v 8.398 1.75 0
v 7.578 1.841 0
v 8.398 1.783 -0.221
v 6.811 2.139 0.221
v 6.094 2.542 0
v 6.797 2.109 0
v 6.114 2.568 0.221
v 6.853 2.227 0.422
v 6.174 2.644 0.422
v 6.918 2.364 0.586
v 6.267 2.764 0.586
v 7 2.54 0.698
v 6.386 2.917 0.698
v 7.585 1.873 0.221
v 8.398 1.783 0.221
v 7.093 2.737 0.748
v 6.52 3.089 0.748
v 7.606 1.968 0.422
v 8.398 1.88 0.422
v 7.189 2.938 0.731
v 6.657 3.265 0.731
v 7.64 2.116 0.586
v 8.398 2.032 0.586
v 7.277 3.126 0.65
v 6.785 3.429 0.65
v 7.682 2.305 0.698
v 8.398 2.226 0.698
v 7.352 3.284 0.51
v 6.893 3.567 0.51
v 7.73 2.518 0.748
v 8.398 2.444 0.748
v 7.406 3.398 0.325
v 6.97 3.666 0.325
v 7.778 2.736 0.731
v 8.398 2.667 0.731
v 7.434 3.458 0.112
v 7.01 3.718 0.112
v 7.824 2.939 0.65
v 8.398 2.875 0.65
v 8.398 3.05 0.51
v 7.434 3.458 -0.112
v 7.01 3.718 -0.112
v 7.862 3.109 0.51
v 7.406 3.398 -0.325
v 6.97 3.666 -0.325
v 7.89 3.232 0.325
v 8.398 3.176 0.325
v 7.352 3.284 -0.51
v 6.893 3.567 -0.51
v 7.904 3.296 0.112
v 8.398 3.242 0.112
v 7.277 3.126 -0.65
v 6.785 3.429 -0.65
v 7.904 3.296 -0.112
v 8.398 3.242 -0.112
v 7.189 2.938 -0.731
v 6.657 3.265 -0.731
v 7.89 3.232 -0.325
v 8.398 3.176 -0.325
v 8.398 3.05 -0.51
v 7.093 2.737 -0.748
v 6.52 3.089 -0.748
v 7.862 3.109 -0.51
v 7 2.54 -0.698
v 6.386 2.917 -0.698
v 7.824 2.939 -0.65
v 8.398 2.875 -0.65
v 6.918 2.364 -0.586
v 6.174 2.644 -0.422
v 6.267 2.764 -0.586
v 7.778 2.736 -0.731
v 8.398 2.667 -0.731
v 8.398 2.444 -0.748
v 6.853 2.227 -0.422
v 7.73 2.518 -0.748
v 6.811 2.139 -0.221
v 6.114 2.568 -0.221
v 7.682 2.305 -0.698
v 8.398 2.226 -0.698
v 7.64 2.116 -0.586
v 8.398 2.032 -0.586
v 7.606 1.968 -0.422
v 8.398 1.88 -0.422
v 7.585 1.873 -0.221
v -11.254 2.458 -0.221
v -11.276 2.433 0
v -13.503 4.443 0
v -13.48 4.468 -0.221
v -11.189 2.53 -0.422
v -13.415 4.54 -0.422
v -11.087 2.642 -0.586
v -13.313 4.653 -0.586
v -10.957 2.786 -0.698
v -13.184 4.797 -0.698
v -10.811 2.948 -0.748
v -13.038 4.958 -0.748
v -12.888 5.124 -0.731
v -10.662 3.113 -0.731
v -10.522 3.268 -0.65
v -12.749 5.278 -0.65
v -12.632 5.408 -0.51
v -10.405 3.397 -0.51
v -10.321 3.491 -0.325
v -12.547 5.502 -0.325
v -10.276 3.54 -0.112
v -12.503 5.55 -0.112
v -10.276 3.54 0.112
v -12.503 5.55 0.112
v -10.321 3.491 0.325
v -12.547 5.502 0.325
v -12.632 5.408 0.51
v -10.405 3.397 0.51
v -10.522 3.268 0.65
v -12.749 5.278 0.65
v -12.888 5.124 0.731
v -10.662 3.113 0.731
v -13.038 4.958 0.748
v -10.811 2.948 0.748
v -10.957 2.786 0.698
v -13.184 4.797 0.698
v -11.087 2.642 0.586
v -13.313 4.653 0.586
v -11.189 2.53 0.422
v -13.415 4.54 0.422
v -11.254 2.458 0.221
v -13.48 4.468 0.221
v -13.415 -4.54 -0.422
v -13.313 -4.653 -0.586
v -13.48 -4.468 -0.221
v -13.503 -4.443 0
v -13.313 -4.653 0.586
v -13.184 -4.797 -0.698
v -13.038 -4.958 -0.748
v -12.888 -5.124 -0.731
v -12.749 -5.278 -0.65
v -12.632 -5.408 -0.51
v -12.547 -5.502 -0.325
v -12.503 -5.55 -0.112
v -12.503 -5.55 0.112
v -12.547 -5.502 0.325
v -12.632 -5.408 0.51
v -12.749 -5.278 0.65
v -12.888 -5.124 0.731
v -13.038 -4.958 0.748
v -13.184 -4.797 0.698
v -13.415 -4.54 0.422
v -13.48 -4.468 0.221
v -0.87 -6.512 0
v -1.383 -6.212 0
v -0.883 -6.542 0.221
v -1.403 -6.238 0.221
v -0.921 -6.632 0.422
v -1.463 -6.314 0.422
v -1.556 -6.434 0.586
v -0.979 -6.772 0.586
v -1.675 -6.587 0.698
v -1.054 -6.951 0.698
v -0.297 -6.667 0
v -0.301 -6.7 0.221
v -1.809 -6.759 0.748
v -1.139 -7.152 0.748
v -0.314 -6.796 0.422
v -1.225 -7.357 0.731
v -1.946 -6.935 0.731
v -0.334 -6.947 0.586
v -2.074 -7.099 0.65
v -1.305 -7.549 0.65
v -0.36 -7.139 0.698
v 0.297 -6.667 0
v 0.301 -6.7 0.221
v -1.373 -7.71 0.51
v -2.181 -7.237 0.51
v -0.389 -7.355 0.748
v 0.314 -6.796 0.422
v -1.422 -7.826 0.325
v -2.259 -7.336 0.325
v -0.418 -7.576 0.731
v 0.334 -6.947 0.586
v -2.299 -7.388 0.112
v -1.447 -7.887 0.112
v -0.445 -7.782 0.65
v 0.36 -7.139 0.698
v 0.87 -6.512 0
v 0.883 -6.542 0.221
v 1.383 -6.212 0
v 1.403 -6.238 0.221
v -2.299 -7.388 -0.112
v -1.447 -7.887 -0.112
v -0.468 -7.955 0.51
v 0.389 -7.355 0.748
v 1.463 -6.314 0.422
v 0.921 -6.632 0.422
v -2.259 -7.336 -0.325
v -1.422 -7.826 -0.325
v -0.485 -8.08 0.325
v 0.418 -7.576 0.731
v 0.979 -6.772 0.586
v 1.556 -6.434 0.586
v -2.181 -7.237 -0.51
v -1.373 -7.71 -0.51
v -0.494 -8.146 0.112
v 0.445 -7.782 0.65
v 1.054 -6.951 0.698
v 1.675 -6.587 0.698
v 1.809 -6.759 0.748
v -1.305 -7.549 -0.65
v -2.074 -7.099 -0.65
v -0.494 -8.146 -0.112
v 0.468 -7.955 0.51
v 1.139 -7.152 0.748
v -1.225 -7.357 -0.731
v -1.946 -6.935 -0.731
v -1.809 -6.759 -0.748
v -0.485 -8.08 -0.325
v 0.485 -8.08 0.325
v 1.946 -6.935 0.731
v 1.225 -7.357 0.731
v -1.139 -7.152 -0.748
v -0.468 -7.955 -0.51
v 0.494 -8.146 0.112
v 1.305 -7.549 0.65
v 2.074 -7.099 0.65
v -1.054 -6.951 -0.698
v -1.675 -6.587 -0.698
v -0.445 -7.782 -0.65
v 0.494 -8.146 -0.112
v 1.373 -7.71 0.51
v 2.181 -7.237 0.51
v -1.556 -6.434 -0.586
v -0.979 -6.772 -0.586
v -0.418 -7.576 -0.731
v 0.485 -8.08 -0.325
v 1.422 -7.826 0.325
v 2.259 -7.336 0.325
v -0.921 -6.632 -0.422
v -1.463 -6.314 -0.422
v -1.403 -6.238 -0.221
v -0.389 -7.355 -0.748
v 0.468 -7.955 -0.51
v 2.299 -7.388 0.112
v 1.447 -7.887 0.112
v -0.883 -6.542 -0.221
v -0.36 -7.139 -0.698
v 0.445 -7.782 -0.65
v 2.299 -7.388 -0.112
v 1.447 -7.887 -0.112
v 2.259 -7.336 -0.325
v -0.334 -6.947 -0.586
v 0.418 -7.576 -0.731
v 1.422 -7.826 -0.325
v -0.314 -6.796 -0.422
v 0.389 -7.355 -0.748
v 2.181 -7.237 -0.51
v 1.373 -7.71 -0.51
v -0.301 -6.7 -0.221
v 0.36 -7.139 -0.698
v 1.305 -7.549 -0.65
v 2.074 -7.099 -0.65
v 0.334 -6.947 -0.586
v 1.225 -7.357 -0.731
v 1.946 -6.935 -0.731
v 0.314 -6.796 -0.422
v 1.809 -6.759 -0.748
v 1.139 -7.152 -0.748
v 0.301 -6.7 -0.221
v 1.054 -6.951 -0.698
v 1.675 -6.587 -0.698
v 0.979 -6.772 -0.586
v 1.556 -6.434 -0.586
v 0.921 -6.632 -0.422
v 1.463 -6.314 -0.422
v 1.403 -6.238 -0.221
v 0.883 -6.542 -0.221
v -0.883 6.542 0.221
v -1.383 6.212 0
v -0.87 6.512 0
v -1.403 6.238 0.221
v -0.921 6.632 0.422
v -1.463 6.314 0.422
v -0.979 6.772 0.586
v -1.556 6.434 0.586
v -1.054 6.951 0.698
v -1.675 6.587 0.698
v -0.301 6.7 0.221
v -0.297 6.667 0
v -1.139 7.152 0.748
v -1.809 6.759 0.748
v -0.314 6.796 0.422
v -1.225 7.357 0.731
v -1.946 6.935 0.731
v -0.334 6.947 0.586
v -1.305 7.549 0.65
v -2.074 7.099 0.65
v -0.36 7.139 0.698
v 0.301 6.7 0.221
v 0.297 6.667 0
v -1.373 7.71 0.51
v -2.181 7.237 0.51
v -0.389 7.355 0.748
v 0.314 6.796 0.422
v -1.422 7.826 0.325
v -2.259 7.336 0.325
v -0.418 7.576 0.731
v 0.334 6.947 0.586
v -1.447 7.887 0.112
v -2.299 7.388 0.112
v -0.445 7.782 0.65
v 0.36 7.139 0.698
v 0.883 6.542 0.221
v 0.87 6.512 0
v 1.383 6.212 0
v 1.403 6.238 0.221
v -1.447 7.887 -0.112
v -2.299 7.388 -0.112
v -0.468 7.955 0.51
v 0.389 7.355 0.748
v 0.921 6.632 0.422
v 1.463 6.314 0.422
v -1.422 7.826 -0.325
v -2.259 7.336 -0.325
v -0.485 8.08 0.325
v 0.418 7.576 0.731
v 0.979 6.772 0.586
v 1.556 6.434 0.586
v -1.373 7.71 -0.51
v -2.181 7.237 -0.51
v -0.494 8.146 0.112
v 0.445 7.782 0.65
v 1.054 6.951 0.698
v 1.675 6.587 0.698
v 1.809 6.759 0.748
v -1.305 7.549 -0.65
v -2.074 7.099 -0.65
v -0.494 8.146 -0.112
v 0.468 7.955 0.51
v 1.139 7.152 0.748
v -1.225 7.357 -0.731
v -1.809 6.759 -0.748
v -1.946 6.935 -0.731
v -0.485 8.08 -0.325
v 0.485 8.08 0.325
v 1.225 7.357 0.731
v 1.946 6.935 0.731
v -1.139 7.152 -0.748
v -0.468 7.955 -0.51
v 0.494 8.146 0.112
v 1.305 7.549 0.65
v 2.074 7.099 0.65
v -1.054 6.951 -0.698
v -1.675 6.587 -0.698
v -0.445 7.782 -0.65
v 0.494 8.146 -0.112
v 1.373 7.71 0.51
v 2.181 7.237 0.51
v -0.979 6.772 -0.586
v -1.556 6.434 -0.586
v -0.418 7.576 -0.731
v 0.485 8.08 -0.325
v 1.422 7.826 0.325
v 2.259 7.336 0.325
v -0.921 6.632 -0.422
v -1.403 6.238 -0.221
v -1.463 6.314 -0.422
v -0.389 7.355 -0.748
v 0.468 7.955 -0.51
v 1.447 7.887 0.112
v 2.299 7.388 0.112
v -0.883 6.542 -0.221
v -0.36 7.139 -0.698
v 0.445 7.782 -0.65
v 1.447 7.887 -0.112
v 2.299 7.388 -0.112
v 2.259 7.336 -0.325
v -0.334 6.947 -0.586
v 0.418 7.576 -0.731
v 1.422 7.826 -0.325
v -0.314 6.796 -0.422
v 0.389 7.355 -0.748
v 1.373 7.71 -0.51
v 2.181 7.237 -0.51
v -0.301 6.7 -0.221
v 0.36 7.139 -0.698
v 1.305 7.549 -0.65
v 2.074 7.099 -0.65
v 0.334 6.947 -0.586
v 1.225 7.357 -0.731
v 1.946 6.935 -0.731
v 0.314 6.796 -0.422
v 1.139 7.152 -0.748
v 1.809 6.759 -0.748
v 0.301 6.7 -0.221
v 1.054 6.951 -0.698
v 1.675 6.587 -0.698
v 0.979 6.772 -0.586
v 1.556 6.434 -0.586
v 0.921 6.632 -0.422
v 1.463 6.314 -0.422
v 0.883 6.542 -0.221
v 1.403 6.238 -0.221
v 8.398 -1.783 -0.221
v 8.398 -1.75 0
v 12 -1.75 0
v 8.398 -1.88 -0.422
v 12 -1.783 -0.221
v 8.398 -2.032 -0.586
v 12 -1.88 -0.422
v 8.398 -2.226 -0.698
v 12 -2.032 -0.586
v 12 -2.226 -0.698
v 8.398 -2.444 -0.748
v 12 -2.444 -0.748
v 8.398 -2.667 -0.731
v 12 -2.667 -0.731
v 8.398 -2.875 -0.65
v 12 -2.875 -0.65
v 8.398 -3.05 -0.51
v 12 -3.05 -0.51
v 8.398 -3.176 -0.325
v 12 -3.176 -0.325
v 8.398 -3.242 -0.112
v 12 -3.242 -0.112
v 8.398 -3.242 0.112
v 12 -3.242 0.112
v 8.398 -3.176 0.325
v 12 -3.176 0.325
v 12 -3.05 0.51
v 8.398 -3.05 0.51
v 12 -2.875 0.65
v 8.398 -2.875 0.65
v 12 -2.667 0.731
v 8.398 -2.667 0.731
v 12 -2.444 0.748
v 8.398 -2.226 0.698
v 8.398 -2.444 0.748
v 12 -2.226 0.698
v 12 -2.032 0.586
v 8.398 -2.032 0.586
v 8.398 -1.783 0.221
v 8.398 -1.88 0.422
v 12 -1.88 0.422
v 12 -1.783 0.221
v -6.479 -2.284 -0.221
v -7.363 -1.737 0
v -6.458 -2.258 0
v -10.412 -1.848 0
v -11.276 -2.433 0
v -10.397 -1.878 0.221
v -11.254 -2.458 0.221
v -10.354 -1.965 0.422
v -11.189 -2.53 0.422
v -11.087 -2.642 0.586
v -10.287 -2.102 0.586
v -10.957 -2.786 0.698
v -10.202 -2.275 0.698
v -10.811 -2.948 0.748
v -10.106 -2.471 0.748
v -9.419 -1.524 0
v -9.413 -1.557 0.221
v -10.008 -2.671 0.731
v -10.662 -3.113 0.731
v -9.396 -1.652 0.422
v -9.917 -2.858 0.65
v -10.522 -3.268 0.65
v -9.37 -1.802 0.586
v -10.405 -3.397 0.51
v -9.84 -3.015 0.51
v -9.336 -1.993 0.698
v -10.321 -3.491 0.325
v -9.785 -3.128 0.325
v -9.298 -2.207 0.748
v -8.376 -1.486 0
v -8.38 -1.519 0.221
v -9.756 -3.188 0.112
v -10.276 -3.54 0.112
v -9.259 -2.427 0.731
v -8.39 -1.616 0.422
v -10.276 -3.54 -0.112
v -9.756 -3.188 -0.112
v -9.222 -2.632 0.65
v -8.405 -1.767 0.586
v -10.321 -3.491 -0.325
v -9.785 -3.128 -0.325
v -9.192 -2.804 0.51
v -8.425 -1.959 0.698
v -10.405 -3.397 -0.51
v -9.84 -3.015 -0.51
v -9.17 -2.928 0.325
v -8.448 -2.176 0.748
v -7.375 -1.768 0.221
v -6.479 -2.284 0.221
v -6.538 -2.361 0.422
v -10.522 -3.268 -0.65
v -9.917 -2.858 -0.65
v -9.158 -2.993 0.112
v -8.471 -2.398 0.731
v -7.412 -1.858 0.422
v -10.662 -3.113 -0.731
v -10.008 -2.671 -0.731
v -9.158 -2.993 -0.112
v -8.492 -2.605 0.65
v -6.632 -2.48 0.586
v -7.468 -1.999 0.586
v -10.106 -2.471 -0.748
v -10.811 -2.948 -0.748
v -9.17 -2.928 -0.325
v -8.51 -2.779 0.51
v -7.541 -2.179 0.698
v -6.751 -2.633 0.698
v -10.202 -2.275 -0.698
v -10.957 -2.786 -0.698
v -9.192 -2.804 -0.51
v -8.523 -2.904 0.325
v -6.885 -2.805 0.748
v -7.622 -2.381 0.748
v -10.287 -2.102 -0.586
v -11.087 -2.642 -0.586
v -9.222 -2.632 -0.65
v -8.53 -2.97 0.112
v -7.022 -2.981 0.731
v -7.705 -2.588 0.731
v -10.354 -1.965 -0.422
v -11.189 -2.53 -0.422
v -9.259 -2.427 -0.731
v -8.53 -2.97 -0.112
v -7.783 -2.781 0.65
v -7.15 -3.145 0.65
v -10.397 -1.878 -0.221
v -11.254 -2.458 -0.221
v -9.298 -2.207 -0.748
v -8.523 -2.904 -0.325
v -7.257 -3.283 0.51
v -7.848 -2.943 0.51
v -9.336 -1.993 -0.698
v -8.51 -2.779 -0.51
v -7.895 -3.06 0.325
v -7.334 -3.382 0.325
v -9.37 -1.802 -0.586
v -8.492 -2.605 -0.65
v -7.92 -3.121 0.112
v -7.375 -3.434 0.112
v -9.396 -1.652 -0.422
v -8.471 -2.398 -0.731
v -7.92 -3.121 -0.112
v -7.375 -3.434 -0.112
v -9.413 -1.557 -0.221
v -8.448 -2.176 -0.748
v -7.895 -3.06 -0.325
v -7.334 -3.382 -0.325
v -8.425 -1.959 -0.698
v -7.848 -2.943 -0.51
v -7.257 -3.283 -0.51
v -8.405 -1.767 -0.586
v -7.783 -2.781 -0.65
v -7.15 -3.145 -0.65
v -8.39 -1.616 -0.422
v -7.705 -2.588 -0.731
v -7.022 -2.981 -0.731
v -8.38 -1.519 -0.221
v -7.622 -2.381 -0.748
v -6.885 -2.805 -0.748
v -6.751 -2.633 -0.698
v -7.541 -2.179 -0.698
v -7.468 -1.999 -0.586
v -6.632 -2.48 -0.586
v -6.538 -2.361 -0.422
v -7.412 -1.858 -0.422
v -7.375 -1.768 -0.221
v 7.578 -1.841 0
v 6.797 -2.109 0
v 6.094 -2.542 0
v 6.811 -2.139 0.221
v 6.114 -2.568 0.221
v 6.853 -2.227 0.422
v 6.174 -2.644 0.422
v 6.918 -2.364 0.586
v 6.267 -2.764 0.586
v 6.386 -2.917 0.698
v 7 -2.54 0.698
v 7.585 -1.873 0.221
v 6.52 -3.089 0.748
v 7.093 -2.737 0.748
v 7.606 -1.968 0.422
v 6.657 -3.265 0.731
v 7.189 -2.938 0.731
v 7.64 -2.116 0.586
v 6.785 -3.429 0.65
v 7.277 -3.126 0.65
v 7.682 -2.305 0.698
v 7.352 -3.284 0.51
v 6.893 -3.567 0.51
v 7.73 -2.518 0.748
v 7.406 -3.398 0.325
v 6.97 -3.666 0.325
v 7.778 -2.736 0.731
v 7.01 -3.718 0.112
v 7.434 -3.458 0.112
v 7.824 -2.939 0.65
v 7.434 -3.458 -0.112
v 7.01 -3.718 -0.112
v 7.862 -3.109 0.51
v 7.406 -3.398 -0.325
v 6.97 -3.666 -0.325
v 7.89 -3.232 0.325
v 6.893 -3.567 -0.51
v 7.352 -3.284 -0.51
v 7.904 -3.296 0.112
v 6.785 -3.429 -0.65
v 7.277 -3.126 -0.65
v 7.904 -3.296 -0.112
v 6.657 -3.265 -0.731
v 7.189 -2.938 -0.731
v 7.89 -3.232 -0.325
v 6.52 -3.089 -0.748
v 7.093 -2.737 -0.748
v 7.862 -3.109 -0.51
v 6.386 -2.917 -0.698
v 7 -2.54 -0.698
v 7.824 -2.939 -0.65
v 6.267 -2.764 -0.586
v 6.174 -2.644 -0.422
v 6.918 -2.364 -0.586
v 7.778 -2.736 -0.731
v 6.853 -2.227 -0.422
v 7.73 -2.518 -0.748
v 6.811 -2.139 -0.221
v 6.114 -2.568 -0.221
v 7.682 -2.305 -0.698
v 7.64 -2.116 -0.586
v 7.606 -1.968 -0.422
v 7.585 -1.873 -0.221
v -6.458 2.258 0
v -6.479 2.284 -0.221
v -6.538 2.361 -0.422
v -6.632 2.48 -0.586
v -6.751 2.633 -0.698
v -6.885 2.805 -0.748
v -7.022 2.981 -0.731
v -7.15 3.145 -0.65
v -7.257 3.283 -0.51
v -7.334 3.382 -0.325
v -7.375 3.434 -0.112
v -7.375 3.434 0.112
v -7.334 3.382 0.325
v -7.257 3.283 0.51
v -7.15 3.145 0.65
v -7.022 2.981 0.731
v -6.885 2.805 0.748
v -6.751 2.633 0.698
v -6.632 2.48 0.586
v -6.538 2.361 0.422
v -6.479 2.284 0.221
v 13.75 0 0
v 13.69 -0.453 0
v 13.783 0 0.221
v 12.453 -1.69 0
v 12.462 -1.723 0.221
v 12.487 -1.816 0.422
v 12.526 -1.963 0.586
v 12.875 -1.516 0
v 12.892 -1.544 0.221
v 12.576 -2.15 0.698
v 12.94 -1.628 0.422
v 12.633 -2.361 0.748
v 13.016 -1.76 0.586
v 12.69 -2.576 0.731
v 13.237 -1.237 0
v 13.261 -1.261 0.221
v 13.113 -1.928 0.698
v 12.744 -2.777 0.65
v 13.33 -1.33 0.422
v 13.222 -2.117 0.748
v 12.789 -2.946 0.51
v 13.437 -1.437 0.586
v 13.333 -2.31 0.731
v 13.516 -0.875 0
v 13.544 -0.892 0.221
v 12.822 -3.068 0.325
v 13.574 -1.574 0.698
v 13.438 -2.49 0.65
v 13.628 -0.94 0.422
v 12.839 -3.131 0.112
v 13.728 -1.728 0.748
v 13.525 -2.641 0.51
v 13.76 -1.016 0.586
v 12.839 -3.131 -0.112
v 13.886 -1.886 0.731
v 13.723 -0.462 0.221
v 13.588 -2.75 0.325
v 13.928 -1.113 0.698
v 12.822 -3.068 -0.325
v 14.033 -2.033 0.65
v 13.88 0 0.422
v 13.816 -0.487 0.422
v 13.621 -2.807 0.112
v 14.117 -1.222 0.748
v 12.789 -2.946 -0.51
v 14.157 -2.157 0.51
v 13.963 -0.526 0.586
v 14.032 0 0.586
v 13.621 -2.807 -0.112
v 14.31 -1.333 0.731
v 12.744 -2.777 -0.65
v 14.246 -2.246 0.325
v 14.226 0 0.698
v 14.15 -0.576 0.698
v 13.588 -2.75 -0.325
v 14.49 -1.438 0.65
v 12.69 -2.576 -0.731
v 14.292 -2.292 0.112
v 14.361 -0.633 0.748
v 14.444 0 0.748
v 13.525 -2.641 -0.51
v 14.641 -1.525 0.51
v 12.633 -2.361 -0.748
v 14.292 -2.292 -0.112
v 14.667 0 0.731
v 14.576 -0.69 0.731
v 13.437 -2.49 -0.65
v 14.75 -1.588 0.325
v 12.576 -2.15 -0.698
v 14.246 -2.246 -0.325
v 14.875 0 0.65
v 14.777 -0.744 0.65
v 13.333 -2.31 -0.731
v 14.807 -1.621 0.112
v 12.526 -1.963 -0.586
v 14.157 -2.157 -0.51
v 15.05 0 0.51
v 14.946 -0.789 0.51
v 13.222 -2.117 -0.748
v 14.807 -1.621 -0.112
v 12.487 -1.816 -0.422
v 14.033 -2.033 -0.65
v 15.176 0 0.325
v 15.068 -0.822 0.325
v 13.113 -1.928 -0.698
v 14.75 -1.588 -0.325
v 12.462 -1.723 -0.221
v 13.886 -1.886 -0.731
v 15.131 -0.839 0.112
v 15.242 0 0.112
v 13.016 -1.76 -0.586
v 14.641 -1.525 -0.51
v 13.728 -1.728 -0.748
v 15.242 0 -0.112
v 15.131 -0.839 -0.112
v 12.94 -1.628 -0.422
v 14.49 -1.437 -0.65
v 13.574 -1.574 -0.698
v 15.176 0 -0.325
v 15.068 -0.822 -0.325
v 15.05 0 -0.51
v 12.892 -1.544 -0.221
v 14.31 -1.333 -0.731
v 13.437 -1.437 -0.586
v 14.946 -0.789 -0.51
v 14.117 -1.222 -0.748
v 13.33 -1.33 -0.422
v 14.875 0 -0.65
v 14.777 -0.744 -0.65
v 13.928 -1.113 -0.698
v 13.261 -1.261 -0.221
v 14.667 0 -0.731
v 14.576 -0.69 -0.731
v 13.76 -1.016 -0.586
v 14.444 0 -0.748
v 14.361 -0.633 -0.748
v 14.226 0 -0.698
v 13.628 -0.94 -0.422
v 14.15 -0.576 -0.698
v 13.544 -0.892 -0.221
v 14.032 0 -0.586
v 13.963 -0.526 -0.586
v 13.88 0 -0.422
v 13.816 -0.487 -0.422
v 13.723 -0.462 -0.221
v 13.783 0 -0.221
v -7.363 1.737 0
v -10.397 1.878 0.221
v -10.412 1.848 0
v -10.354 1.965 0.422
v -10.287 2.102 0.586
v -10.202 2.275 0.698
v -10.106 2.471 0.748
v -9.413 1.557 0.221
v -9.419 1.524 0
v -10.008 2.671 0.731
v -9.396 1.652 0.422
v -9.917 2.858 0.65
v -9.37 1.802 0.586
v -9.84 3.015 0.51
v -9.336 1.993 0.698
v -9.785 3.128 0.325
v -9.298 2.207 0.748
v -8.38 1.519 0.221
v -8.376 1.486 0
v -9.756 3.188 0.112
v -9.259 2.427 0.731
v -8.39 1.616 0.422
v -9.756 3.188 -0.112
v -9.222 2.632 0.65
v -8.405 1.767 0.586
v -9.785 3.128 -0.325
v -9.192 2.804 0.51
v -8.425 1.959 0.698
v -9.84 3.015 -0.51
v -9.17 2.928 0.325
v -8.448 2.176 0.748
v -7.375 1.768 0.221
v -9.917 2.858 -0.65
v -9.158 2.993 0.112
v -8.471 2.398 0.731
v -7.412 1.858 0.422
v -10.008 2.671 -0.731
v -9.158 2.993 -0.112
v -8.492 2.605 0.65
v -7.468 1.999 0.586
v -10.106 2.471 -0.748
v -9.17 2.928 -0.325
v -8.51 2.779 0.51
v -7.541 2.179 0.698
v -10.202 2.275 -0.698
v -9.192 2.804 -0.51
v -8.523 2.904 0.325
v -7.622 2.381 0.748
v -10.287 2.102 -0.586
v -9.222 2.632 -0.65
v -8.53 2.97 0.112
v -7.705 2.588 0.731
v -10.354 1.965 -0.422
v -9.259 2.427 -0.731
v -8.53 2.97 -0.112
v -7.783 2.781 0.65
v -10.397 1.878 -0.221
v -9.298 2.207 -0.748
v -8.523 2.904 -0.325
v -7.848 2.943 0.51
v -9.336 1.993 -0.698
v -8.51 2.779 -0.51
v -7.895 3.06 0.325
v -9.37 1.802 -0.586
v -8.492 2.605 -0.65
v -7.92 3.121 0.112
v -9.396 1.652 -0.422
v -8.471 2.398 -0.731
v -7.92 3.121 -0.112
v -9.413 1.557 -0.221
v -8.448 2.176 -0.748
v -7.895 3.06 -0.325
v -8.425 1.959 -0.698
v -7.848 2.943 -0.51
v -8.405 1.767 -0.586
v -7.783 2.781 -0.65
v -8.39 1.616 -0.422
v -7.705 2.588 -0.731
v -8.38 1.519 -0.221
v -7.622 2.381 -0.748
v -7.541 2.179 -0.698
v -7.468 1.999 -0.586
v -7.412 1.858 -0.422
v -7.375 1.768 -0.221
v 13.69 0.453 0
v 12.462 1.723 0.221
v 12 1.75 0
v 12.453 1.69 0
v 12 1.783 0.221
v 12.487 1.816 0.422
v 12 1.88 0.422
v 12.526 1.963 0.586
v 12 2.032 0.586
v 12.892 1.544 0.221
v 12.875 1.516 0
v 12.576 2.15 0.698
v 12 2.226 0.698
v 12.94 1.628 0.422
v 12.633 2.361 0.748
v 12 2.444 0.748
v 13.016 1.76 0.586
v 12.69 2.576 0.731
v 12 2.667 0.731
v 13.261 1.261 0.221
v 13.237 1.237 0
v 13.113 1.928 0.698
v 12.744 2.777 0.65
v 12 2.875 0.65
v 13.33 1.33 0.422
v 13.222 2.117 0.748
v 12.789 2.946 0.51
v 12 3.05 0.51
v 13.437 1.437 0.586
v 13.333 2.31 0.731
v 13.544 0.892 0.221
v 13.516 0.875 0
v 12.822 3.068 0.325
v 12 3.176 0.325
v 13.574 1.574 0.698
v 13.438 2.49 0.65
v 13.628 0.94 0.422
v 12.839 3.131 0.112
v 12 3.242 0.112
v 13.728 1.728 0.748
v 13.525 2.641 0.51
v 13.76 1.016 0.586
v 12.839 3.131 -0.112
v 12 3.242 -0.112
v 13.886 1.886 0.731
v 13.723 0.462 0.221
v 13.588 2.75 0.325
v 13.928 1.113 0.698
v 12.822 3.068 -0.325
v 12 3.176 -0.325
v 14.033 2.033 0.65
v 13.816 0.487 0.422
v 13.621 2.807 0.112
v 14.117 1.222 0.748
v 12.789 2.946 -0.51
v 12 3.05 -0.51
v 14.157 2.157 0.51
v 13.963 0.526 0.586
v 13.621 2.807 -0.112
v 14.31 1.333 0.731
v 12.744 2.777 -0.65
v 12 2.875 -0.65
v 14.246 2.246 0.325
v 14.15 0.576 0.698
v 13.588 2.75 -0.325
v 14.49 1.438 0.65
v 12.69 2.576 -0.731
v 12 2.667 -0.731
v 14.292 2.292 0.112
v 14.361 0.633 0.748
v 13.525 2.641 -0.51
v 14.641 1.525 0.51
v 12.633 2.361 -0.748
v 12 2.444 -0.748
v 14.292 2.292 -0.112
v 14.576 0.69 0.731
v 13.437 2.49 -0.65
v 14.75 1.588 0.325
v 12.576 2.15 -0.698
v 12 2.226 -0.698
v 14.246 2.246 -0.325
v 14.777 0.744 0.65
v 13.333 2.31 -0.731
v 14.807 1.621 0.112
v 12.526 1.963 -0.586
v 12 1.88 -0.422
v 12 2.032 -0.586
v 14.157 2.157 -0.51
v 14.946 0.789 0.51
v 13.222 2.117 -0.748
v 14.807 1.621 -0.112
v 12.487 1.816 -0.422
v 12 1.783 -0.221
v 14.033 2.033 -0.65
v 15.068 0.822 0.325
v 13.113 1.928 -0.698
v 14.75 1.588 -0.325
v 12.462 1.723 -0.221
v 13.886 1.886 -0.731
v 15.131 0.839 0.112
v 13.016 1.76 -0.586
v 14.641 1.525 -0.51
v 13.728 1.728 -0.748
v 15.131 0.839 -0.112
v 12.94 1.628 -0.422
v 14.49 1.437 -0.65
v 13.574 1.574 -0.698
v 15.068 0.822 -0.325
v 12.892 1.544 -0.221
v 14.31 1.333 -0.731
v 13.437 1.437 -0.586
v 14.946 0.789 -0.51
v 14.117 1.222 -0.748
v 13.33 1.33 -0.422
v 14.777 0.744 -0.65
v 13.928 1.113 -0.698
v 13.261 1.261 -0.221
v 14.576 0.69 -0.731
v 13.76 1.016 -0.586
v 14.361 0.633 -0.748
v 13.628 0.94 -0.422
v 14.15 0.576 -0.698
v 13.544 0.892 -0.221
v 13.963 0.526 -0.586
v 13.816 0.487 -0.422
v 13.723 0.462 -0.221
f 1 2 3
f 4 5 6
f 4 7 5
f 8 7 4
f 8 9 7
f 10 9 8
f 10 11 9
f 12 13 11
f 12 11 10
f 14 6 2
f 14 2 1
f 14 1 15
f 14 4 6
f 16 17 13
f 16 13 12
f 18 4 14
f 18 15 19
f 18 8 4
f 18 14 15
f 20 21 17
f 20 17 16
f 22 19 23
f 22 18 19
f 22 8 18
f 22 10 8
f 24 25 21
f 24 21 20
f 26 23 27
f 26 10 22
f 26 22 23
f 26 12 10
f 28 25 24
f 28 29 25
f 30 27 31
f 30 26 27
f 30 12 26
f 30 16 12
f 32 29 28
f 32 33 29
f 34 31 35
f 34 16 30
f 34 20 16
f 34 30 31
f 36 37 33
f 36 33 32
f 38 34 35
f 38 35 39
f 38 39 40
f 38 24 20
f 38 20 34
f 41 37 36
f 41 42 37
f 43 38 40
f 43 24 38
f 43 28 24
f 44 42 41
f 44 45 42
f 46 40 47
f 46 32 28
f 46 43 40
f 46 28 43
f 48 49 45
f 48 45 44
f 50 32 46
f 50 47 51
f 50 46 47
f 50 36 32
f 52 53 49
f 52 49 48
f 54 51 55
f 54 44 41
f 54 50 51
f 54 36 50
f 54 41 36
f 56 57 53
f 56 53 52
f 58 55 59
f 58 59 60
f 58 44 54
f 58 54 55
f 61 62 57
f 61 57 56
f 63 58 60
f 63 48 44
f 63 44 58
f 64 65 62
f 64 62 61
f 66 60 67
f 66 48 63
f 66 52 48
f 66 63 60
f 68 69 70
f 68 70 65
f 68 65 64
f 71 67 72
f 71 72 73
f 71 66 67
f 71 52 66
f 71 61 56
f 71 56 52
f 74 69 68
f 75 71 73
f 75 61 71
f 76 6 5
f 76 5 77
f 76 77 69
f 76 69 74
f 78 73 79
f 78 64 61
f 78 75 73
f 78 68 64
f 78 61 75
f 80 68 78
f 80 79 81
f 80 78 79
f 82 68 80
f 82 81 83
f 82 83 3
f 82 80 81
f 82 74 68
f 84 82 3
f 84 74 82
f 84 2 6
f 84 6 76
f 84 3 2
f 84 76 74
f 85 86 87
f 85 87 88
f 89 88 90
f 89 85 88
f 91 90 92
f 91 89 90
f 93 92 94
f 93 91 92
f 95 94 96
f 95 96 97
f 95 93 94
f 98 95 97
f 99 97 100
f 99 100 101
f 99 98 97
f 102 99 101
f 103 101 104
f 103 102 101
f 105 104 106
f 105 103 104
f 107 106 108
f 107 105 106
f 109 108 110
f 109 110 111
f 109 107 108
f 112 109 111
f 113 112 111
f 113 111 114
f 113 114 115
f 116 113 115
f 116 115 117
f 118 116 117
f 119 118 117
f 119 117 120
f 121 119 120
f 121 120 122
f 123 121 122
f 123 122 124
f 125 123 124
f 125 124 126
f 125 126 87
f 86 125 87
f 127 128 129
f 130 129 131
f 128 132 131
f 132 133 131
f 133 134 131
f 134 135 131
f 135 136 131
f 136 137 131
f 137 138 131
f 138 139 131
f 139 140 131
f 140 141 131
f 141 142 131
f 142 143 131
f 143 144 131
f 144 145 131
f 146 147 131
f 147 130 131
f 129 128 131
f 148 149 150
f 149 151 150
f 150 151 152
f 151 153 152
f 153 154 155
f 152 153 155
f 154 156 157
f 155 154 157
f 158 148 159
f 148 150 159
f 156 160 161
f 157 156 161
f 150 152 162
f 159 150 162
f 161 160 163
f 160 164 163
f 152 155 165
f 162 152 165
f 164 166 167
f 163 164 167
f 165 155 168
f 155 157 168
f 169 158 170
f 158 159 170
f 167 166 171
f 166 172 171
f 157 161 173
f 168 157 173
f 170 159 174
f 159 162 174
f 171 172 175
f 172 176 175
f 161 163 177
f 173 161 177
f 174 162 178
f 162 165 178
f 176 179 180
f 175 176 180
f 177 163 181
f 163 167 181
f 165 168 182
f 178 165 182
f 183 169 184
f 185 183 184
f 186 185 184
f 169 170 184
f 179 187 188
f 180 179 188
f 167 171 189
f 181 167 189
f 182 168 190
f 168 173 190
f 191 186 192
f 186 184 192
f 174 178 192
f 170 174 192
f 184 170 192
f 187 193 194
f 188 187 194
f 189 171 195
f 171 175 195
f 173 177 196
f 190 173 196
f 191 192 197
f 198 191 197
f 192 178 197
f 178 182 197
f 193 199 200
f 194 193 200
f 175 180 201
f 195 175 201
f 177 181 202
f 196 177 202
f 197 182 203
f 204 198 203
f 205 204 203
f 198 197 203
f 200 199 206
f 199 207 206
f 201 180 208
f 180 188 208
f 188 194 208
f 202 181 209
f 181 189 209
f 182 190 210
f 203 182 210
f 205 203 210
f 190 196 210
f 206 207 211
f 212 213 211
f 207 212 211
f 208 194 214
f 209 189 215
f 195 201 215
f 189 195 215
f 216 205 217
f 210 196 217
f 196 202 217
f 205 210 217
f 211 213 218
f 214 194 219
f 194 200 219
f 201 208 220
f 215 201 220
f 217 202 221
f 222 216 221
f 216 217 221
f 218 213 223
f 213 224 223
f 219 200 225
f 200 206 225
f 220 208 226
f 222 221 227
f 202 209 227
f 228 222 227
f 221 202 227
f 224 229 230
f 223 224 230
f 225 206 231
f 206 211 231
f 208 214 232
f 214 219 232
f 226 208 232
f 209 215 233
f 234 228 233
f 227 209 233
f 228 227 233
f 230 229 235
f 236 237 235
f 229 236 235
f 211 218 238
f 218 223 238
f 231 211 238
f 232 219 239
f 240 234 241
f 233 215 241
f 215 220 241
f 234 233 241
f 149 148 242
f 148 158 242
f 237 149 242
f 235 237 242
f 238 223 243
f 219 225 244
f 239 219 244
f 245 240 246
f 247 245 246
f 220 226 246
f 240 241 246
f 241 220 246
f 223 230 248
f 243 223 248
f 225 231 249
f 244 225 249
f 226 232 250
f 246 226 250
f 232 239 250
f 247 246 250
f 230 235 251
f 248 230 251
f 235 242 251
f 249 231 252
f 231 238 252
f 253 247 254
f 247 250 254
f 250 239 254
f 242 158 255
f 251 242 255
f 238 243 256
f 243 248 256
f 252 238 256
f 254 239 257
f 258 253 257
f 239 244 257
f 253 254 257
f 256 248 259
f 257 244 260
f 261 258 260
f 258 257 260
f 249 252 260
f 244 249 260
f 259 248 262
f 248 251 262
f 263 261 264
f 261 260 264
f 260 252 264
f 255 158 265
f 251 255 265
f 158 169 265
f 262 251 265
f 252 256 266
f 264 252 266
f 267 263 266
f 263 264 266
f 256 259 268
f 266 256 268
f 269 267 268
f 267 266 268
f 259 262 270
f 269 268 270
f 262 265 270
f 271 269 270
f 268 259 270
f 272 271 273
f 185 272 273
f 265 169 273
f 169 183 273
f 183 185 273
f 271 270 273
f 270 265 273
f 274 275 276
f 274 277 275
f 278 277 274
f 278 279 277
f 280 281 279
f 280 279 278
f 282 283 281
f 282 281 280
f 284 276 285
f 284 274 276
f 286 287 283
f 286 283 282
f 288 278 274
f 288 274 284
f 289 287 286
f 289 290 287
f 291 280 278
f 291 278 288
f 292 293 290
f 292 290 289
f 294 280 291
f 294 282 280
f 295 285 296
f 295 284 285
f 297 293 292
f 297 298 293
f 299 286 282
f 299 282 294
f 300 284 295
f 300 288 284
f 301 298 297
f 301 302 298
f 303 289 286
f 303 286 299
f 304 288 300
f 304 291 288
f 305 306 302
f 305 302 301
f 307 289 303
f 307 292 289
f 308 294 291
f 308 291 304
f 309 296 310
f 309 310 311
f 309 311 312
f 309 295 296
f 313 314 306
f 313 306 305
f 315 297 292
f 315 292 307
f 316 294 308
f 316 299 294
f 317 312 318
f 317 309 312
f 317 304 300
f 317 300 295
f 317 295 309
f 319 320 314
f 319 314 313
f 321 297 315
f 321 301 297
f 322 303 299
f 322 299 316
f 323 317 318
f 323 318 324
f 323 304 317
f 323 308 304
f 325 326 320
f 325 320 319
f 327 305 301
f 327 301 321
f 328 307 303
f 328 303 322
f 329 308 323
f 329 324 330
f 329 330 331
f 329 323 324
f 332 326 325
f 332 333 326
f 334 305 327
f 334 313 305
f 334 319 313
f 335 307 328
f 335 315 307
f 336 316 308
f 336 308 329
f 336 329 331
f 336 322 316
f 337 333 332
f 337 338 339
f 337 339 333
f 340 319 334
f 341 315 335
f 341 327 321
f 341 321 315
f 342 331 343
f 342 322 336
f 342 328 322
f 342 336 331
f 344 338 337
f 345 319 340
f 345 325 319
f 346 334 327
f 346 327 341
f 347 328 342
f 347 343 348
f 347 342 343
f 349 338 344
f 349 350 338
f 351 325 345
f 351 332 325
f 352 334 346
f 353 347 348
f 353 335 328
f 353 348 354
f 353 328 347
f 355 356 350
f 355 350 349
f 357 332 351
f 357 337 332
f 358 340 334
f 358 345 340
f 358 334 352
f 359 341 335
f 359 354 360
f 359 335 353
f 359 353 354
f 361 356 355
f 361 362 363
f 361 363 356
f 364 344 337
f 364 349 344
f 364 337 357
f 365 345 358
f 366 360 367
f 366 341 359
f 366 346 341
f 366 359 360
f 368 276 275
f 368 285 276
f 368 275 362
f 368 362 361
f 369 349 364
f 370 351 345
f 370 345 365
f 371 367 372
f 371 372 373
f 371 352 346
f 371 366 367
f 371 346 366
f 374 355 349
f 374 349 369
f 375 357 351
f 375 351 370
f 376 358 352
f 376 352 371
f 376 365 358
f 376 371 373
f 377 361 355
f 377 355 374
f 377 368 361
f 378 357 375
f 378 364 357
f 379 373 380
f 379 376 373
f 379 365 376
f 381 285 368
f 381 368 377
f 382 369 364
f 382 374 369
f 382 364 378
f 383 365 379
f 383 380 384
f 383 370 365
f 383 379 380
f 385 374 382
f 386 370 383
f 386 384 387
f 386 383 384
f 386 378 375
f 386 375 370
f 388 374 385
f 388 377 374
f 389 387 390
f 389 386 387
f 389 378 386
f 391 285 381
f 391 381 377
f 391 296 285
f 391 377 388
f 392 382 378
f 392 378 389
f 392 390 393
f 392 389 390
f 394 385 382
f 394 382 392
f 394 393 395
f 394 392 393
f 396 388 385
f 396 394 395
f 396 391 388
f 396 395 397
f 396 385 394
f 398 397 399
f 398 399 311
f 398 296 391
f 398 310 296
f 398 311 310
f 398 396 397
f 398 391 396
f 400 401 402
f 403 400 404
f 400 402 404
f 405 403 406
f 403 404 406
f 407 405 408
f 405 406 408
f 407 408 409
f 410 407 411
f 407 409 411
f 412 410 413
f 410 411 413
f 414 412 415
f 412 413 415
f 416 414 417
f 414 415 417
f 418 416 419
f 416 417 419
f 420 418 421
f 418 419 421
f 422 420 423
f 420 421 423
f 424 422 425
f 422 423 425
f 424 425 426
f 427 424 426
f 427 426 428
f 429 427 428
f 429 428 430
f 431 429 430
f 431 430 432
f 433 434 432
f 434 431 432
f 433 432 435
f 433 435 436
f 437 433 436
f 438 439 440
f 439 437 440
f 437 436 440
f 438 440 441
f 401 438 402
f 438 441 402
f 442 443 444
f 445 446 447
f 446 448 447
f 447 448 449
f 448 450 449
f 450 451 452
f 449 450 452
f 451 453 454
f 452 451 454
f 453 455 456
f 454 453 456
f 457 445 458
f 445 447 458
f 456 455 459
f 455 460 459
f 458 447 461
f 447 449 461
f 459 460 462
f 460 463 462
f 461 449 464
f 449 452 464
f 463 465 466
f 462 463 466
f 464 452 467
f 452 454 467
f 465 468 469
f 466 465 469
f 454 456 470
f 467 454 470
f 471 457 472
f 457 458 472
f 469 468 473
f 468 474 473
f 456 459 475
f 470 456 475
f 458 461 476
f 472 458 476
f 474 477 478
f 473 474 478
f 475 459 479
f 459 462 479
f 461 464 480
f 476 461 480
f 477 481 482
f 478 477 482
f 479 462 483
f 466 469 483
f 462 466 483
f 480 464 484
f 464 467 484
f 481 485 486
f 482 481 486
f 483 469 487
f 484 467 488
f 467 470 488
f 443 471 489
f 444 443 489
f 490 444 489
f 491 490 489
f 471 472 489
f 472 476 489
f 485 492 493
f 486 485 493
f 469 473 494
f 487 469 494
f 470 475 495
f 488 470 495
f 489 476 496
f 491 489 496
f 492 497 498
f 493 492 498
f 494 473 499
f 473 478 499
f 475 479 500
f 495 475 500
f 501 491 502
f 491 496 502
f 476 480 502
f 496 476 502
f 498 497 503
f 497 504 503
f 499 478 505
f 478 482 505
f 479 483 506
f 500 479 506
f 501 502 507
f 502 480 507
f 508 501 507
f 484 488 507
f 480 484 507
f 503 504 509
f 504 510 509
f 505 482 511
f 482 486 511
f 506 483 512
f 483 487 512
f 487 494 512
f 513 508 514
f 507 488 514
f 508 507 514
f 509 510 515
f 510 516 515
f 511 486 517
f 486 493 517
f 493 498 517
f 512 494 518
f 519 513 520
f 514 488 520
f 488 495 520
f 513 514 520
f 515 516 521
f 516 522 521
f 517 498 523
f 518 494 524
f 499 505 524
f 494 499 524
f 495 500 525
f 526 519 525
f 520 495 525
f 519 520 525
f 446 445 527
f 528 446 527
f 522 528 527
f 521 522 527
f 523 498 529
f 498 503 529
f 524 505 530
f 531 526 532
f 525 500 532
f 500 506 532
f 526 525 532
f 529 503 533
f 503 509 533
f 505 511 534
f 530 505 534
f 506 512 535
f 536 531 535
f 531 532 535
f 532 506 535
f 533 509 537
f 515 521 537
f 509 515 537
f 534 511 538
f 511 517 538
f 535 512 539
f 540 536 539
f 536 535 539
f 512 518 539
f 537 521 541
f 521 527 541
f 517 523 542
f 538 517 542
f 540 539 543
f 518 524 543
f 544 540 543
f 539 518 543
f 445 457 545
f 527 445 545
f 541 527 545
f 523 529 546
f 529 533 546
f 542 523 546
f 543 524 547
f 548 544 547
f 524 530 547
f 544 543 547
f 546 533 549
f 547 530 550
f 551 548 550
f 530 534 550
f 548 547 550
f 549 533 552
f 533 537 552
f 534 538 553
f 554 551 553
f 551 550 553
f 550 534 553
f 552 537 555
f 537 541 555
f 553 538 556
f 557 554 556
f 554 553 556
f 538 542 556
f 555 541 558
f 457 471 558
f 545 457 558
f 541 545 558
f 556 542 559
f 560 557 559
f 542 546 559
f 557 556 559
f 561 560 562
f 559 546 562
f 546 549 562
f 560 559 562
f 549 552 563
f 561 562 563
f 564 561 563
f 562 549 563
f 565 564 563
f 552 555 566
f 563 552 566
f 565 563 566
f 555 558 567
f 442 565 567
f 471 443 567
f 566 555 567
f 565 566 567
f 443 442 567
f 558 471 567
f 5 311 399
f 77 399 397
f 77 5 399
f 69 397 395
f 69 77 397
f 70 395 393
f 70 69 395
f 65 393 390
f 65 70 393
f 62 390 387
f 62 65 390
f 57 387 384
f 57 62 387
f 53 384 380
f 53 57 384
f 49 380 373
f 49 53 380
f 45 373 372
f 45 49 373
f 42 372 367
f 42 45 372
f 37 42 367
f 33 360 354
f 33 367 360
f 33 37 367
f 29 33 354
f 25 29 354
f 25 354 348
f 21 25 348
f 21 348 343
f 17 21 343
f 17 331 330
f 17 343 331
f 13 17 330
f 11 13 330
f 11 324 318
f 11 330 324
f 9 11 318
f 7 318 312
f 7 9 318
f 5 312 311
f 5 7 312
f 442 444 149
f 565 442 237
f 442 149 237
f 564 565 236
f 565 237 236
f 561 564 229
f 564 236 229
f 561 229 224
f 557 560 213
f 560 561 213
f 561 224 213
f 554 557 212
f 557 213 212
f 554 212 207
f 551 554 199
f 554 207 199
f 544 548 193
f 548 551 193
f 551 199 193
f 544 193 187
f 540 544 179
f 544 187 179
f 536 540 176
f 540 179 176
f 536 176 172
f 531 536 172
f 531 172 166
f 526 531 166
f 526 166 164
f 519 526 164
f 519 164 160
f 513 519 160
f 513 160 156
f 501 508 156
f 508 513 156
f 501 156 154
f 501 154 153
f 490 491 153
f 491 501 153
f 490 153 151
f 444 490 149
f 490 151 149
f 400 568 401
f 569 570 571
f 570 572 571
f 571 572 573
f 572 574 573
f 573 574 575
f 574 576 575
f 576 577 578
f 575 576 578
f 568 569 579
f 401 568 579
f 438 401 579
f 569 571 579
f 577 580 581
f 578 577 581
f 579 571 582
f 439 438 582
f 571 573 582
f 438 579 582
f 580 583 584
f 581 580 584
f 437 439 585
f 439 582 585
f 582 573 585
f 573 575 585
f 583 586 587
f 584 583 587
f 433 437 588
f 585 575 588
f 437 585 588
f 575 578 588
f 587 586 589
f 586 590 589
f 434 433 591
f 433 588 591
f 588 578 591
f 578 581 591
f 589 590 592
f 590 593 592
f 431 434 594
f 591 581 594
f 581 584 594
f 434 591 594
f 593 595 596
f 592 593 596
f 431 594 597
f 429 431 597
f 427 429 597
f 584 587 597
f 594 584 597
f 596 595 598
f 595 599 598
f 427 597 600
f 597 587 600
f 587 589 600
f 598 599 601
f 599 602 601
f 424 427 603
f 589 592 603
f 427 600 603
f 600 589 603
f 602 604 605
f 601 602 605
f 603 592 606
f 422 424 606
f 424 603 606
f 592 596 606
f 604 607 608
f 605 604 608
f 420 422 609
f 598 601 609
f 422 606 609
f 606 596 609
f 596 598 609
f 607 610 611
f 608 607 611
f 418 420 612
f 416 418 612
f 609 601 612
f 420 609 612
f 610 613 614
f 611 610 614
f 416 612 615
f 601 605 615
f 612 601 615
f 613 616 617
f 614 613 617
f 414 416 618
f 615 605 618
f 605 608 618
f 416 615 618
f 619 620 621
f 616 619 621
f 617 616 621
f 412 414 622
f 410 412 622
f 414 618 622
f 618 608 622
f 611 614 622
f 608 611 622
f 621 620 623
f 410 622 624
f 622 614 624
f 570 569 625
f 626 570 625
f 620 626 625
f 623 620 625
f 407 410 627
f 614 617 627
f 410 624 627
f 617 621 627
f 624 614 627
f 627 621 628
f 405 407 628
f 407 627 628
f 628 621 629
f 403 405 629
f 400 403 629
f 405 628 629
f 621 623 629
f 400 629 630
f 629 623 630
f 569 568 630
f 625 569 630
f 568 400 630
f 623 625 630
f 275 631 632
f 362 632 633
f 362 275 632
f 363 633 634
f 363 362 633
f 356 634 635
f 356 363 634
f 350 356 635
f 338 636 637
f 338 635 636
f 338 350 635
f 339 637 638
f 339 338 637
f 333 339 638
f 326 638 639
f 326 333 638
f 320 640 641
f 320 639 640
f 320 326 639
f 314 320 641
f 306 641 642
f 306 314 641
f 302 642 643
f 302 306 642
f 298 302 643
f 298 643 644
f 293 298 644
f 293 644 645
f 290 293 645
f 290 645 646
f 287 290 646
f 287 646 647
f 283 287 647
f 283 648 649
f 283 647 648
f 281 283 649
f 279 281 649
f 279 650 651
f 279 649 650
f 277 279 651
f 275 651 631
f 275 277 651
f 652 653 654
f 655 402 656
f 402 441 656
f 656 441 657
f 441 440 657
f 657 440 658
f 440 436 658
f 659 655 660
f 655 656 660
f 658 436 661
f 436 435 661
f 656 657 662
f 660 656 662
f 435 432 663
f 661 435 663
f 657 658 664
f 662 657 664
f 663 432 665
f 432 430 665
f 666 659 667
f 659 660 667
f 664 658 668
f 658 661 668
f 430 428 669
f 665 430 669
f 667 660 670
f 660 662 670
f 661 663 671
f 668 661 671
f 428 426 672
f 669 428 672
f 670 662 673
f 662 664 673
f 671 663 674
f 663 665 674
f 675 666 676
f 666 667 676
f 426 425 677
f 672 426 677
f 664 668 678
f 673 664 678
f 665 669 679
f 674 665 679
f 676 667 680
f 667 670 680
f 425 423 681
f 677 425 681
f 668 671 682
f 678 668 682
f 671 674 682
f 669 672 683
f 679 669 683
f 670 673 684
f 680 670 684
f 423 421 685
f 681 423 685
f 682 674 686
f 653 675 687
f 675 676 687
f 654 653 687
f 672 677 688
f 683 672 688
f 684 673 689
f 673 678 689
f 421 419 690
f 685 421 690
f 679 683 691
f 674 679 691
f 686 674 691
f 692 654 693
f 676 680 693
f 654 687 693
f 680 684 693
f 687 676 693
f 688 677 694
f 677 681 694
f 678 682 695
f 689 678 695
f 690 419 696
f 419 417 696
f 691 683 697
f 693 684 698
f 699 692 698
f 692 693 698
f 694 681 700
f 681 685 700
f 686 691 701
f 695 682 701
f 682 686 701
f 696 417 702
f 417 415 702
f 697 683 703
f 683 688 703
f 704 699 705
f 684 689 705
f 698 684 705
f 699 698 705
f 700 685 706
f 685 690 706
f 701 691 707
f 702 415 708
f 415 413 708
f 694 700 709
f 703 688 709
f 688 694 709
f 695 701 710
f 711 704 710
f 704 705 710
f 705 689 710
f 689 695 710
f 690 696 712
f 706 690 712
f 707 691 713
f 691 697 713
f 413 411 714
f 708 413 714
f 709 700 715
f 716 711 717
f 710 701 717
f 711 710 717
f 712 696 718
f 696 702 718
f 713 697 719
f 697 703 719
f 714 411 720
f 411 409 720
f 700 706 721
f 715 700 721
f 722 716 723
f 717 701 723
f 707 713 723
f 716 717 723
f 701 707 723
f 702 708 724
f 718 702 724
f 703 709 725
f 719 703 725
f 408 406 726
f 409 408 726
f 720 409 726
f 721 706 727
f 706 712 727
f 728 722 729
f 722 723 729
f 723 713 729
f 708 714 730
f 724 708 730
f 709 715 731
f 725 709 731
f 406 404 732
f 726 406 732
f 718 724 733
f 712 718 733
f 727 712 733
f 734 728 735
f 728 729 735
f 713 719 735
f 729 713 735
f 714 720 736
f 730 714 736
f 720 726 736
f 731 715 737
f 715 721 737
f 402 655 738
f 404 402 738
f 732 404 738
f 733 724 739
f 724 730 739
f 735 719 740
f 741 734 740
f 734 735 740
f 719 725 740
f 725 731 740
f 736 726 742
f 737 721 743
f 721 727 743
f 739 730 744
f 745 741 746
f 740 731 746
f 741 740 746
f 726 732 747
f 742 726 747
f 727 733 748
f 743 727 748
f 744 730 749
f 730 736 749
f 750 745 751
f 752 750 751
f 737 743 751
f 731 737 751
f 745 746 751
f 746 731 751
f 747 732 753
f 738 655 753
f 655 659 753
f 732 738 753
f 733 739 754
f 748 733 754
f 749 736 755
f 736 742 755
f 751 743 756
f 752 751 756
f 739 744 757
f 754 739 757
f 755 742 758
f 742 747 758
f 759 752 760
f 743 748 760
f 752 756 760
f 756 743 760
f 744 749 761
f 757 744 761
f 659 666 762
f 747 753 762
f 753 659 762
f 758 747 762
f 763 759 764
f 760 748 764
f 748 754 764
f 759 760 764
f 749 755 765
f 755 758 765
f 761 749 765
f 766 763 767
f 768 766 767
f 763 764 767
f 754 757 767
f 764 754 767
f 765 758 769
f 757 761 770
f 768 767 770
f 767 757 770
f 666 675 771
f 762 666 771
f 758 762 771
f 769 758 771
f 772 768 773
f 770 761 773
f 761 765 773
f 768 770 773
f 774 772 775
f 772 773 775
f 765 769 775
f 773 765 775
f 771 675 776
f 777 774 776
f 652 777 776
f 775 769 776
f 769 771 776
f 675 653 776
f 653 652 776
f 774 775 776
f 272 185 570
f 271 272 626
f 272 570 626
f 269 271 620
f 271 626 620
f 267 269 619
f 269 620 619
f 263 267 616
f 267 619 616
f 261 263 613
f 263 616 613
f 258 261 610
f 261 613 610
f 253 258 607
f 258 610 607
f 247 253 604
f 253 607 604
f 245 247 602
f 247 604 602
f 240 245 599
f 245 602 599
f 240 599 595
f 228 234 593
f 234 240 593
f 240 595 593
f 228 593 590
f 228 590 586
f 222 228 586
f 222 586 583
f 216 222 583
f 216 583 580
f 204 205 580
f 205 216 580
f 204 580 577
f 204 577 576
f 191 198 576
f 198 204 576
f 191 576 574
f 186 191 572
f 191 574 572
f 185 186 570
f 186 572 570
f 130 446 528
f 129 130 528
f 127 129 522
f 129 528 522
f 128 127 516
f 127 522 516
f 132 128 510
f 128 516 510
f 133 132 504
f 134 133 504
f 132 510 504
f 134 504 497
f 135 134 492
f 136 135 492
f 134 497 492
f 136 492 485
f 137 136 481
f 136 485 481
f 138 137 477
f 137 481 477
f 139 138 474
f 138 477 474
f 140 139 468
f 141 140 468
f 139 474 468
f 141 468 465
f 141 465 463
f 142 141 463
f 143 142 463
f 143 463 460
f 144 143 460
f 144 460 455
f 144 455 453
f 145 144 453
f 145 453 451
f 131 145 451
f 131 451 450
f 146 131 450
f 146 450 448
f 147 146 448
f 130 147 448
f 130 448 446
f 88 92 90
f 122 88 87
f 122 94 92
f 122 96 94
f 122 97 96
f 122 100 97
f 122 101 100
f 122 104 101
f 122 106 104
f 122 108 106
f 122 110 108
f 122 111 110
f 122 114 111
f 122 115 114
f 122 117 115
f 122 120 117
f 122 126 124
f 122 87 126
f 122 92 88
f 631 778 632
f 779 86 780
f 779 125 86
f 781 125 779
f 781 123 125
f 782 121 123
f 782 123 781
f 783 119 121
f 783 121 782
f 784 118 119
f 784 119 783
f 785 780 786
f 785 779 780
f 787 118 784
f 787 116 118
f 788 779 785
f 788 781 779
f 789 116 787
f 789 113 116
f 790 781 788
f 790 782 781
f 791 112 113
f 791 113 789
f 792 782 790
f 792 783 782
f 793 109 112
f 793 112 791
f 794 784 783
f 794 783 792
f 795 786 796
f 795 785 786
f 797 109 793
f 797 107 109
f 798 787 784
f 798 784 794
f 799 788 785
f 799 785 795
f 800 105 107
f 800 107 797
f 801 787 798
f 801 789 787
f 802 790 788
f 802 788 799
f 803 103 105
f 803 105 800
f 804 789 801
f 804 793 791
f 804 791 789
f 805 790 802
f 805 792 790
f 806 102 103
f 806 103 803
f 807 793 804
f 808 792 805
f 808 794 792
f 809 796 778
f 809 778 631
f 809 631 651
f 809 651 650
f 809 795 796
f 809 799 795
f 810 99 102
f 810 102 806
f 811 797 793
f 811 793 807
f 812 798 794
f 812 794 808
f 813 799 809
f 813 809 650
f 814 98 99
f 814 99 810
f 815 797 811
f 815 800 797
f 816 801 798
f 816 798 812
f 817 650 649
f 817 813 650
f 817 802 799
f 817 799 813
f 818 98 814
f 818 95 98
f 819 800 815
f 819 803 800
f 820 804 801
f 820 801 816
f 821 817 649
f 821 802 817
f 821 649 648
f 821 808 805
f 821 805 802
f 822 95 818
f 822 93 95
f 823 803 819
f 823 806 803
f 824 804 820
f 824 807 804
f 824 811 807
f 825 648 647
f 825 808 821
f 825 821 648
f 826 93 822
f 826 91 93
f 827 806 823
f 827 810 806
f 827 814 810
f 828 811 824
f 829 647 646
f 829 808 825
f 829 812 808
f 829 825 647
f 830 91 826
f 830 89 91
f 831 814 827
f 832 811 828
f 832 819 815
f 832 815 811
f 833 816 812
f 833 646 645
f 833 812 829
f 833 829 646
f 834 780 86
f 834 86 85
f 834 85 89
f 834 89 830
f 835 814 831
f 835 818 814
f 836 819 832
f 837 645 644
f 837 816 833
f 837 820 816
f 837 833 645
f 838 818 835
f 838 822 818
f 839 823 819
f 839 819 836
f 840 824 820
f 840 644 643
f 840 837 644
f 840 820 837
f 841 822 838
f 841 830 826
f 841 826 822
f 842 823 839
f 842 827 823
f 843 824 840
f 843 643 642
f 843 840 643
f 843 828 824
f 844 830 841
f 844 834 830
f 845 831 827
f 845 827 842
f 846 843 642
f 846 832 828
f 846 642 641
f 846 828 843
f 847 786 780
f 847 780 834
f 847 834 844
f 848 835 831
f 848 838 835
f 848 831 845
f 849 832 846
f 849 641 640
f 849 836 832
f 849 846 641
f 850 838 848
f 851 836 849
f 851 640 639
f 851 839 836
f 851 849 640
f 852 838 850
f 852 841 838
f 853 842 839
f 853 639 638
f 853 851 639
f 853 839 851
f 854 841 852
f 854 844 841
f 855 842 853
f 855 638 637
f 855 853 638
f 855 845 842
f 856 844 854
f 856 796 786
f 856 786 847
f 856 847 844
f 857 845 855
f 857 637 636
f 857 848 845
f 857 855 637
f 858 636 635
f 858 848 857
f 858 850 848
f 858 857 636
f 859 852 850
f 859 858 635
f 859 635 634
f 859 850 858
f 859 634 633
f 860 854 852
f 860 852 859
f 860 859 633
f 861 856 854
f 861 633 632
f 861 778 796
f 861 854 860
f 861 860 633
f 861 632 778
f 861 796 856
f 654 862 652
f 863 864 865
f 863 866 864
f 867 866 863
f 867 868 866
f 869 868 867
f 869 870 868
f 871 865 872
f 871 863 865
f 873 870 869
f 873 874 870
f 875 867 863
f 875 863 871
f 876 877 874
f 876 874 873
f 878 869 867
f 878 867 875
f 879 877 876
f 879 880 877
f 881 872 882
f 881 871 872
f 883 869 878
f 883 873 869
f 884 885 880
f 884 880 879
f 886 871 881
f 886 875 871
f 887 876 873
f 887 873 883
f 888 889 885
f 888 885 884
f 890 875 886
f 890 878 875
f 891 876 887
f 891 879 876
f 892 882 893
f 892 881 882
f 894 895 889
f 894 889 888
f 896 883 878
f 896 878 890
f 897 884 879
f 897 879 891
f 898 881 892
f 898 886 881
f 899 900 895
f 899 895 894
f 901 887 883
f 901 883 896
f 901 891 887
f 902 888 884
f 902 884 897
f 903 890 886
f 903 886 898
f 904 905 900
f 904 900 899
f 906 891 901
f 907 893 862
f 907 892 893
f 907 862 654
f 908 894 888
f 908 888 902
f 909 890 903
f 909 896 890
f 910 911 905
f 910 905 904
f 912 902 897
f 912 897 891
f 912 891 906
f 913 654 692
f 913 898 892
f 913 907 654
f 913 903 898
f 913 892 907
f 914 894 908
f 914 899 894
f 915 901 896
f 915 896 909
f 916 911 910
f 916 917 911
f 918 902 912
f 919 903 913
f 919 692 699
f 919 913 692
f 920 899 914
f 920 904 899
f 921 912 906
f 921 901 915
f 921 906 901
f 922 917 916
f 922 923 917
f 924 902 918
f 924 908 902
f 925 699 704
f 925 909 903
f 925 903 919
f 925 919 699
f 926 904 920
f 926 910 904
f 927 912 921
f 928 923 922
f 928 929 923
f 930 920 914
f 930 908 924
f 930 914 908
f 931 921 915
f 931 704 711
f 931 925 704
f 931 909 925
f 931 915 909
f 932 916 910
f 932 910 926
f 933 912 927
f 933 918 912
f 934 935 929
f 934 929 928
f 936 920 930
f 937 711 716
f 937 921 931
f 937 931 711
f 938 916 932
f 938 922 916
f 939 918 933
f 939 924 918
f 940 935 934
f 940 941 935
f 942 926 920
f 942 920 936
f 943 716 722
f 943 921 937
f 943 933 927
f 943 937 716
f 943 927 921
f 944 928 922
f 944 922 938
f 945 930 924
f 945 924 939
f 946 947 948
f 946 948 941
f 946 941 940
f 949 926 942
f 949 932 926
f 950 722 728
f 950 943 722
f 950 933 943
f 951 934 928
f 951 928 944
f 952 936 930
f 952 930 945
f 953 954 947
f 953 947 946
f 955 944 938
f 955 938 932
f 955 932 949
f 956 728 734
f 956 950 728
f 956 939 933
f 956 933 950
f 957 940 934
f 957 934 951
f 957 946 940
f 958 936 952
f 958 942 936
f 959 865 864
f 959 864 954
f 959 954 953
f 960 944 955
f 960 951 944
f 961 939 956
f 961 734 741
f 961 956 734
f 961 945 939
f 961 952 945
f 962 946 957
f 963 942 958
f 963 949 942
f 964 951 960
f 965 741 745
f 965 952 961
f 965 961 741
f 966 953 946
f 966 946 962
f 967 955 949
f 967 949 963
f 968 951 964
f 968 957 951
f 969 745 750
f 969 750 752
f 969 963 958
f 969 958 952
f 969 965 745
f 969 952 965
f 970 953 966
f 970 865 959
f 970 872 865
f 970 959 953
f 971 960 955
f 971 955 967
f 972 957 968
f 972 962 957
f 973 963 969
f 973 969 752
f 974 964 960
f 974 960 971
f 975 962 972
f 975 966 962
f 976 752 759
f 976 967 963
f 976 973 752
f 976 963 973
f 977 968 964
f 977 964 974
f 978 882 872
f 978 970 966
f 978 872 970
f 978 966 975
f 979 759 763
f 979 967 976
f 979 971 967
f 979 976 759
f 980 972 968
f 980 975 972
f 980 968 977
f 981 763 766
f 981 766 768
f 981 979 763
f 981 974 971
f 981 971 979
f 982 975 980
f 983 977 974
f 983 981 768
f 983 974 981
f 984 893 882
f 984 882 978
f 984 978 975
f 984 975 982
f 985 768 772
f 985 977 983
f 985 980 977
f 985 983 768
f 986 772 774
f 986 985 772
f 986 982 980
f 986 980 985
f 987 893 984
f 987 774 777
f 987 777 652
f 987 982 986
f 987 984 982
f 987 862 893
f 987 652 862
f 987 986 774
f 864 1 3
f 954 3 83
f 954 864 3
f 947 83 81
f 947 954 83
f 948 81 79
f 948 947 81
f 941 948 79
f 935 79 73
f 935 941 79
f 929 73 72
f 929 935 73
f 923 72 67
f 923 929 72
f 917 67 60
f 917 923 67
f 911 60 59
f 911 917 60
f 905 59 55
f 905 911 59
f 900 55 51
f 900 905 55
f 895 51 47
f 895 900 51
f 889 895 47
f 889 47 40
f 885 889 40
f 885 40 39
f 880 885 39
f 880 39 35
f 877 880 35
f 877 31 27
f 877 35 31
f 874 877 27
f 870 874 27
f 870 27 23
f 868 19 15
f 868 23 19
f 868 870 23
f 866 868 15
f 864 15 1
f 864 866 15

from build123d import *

# Parameters (mm, degrees)
SKETCH001_R = 0.75


with BuildPart() as part:
    # AdditivePipe: sweep along a path in Sketch
    with BuildLine(Plane.XY) as additivepipe_path:
        Line((-13, 5), (-10.7734145441, 2.9894485314))
        ThreePointArc((-10.7734145441, 2.9894485314), (-8.8718133128, 2.2180129991), (-6.9192330545, 2.8493848064))
        Line((-6.9192330545, 2.8493848064), (-1.843630021, 6.8033016788))
        ThreePointArc((-1.843630021, 6.8033016788), (0, 7.4366524978), (1.843630021, 6.8033016788))
        Line((1.843630021, 6.8033016788), (6.5547087607, 3.1333508191))
        ThreePointArc((6.5547087607, 3.1333508191), (7.4236458924, 2.6627524304), (8.3983387818, 2.5))
        Line((8.3983387818, 2.5), (12, 2.5))
        ThreePointArc((12, 2.5), (13.767766953, 1.767766953), (14.5, 0))
    # Sketch001 (on DatumPlane) → AdditivePipe (sweep)
    with BuildSketch(Plane(origin=(-13, 5, 0), x_dir=(-0.6701838229, -0.742195152, 0), z_dir=(-0.742195152, 0.6701838229, 0))):
        Circle(SKETCH001_R)
    additivepipe = sweep(path=additivepipe_path.line)

    # Mirrored: AdditivePipe across XZ
    add(additivepipe.mirror(Plane.XZ))


solid = part.part
